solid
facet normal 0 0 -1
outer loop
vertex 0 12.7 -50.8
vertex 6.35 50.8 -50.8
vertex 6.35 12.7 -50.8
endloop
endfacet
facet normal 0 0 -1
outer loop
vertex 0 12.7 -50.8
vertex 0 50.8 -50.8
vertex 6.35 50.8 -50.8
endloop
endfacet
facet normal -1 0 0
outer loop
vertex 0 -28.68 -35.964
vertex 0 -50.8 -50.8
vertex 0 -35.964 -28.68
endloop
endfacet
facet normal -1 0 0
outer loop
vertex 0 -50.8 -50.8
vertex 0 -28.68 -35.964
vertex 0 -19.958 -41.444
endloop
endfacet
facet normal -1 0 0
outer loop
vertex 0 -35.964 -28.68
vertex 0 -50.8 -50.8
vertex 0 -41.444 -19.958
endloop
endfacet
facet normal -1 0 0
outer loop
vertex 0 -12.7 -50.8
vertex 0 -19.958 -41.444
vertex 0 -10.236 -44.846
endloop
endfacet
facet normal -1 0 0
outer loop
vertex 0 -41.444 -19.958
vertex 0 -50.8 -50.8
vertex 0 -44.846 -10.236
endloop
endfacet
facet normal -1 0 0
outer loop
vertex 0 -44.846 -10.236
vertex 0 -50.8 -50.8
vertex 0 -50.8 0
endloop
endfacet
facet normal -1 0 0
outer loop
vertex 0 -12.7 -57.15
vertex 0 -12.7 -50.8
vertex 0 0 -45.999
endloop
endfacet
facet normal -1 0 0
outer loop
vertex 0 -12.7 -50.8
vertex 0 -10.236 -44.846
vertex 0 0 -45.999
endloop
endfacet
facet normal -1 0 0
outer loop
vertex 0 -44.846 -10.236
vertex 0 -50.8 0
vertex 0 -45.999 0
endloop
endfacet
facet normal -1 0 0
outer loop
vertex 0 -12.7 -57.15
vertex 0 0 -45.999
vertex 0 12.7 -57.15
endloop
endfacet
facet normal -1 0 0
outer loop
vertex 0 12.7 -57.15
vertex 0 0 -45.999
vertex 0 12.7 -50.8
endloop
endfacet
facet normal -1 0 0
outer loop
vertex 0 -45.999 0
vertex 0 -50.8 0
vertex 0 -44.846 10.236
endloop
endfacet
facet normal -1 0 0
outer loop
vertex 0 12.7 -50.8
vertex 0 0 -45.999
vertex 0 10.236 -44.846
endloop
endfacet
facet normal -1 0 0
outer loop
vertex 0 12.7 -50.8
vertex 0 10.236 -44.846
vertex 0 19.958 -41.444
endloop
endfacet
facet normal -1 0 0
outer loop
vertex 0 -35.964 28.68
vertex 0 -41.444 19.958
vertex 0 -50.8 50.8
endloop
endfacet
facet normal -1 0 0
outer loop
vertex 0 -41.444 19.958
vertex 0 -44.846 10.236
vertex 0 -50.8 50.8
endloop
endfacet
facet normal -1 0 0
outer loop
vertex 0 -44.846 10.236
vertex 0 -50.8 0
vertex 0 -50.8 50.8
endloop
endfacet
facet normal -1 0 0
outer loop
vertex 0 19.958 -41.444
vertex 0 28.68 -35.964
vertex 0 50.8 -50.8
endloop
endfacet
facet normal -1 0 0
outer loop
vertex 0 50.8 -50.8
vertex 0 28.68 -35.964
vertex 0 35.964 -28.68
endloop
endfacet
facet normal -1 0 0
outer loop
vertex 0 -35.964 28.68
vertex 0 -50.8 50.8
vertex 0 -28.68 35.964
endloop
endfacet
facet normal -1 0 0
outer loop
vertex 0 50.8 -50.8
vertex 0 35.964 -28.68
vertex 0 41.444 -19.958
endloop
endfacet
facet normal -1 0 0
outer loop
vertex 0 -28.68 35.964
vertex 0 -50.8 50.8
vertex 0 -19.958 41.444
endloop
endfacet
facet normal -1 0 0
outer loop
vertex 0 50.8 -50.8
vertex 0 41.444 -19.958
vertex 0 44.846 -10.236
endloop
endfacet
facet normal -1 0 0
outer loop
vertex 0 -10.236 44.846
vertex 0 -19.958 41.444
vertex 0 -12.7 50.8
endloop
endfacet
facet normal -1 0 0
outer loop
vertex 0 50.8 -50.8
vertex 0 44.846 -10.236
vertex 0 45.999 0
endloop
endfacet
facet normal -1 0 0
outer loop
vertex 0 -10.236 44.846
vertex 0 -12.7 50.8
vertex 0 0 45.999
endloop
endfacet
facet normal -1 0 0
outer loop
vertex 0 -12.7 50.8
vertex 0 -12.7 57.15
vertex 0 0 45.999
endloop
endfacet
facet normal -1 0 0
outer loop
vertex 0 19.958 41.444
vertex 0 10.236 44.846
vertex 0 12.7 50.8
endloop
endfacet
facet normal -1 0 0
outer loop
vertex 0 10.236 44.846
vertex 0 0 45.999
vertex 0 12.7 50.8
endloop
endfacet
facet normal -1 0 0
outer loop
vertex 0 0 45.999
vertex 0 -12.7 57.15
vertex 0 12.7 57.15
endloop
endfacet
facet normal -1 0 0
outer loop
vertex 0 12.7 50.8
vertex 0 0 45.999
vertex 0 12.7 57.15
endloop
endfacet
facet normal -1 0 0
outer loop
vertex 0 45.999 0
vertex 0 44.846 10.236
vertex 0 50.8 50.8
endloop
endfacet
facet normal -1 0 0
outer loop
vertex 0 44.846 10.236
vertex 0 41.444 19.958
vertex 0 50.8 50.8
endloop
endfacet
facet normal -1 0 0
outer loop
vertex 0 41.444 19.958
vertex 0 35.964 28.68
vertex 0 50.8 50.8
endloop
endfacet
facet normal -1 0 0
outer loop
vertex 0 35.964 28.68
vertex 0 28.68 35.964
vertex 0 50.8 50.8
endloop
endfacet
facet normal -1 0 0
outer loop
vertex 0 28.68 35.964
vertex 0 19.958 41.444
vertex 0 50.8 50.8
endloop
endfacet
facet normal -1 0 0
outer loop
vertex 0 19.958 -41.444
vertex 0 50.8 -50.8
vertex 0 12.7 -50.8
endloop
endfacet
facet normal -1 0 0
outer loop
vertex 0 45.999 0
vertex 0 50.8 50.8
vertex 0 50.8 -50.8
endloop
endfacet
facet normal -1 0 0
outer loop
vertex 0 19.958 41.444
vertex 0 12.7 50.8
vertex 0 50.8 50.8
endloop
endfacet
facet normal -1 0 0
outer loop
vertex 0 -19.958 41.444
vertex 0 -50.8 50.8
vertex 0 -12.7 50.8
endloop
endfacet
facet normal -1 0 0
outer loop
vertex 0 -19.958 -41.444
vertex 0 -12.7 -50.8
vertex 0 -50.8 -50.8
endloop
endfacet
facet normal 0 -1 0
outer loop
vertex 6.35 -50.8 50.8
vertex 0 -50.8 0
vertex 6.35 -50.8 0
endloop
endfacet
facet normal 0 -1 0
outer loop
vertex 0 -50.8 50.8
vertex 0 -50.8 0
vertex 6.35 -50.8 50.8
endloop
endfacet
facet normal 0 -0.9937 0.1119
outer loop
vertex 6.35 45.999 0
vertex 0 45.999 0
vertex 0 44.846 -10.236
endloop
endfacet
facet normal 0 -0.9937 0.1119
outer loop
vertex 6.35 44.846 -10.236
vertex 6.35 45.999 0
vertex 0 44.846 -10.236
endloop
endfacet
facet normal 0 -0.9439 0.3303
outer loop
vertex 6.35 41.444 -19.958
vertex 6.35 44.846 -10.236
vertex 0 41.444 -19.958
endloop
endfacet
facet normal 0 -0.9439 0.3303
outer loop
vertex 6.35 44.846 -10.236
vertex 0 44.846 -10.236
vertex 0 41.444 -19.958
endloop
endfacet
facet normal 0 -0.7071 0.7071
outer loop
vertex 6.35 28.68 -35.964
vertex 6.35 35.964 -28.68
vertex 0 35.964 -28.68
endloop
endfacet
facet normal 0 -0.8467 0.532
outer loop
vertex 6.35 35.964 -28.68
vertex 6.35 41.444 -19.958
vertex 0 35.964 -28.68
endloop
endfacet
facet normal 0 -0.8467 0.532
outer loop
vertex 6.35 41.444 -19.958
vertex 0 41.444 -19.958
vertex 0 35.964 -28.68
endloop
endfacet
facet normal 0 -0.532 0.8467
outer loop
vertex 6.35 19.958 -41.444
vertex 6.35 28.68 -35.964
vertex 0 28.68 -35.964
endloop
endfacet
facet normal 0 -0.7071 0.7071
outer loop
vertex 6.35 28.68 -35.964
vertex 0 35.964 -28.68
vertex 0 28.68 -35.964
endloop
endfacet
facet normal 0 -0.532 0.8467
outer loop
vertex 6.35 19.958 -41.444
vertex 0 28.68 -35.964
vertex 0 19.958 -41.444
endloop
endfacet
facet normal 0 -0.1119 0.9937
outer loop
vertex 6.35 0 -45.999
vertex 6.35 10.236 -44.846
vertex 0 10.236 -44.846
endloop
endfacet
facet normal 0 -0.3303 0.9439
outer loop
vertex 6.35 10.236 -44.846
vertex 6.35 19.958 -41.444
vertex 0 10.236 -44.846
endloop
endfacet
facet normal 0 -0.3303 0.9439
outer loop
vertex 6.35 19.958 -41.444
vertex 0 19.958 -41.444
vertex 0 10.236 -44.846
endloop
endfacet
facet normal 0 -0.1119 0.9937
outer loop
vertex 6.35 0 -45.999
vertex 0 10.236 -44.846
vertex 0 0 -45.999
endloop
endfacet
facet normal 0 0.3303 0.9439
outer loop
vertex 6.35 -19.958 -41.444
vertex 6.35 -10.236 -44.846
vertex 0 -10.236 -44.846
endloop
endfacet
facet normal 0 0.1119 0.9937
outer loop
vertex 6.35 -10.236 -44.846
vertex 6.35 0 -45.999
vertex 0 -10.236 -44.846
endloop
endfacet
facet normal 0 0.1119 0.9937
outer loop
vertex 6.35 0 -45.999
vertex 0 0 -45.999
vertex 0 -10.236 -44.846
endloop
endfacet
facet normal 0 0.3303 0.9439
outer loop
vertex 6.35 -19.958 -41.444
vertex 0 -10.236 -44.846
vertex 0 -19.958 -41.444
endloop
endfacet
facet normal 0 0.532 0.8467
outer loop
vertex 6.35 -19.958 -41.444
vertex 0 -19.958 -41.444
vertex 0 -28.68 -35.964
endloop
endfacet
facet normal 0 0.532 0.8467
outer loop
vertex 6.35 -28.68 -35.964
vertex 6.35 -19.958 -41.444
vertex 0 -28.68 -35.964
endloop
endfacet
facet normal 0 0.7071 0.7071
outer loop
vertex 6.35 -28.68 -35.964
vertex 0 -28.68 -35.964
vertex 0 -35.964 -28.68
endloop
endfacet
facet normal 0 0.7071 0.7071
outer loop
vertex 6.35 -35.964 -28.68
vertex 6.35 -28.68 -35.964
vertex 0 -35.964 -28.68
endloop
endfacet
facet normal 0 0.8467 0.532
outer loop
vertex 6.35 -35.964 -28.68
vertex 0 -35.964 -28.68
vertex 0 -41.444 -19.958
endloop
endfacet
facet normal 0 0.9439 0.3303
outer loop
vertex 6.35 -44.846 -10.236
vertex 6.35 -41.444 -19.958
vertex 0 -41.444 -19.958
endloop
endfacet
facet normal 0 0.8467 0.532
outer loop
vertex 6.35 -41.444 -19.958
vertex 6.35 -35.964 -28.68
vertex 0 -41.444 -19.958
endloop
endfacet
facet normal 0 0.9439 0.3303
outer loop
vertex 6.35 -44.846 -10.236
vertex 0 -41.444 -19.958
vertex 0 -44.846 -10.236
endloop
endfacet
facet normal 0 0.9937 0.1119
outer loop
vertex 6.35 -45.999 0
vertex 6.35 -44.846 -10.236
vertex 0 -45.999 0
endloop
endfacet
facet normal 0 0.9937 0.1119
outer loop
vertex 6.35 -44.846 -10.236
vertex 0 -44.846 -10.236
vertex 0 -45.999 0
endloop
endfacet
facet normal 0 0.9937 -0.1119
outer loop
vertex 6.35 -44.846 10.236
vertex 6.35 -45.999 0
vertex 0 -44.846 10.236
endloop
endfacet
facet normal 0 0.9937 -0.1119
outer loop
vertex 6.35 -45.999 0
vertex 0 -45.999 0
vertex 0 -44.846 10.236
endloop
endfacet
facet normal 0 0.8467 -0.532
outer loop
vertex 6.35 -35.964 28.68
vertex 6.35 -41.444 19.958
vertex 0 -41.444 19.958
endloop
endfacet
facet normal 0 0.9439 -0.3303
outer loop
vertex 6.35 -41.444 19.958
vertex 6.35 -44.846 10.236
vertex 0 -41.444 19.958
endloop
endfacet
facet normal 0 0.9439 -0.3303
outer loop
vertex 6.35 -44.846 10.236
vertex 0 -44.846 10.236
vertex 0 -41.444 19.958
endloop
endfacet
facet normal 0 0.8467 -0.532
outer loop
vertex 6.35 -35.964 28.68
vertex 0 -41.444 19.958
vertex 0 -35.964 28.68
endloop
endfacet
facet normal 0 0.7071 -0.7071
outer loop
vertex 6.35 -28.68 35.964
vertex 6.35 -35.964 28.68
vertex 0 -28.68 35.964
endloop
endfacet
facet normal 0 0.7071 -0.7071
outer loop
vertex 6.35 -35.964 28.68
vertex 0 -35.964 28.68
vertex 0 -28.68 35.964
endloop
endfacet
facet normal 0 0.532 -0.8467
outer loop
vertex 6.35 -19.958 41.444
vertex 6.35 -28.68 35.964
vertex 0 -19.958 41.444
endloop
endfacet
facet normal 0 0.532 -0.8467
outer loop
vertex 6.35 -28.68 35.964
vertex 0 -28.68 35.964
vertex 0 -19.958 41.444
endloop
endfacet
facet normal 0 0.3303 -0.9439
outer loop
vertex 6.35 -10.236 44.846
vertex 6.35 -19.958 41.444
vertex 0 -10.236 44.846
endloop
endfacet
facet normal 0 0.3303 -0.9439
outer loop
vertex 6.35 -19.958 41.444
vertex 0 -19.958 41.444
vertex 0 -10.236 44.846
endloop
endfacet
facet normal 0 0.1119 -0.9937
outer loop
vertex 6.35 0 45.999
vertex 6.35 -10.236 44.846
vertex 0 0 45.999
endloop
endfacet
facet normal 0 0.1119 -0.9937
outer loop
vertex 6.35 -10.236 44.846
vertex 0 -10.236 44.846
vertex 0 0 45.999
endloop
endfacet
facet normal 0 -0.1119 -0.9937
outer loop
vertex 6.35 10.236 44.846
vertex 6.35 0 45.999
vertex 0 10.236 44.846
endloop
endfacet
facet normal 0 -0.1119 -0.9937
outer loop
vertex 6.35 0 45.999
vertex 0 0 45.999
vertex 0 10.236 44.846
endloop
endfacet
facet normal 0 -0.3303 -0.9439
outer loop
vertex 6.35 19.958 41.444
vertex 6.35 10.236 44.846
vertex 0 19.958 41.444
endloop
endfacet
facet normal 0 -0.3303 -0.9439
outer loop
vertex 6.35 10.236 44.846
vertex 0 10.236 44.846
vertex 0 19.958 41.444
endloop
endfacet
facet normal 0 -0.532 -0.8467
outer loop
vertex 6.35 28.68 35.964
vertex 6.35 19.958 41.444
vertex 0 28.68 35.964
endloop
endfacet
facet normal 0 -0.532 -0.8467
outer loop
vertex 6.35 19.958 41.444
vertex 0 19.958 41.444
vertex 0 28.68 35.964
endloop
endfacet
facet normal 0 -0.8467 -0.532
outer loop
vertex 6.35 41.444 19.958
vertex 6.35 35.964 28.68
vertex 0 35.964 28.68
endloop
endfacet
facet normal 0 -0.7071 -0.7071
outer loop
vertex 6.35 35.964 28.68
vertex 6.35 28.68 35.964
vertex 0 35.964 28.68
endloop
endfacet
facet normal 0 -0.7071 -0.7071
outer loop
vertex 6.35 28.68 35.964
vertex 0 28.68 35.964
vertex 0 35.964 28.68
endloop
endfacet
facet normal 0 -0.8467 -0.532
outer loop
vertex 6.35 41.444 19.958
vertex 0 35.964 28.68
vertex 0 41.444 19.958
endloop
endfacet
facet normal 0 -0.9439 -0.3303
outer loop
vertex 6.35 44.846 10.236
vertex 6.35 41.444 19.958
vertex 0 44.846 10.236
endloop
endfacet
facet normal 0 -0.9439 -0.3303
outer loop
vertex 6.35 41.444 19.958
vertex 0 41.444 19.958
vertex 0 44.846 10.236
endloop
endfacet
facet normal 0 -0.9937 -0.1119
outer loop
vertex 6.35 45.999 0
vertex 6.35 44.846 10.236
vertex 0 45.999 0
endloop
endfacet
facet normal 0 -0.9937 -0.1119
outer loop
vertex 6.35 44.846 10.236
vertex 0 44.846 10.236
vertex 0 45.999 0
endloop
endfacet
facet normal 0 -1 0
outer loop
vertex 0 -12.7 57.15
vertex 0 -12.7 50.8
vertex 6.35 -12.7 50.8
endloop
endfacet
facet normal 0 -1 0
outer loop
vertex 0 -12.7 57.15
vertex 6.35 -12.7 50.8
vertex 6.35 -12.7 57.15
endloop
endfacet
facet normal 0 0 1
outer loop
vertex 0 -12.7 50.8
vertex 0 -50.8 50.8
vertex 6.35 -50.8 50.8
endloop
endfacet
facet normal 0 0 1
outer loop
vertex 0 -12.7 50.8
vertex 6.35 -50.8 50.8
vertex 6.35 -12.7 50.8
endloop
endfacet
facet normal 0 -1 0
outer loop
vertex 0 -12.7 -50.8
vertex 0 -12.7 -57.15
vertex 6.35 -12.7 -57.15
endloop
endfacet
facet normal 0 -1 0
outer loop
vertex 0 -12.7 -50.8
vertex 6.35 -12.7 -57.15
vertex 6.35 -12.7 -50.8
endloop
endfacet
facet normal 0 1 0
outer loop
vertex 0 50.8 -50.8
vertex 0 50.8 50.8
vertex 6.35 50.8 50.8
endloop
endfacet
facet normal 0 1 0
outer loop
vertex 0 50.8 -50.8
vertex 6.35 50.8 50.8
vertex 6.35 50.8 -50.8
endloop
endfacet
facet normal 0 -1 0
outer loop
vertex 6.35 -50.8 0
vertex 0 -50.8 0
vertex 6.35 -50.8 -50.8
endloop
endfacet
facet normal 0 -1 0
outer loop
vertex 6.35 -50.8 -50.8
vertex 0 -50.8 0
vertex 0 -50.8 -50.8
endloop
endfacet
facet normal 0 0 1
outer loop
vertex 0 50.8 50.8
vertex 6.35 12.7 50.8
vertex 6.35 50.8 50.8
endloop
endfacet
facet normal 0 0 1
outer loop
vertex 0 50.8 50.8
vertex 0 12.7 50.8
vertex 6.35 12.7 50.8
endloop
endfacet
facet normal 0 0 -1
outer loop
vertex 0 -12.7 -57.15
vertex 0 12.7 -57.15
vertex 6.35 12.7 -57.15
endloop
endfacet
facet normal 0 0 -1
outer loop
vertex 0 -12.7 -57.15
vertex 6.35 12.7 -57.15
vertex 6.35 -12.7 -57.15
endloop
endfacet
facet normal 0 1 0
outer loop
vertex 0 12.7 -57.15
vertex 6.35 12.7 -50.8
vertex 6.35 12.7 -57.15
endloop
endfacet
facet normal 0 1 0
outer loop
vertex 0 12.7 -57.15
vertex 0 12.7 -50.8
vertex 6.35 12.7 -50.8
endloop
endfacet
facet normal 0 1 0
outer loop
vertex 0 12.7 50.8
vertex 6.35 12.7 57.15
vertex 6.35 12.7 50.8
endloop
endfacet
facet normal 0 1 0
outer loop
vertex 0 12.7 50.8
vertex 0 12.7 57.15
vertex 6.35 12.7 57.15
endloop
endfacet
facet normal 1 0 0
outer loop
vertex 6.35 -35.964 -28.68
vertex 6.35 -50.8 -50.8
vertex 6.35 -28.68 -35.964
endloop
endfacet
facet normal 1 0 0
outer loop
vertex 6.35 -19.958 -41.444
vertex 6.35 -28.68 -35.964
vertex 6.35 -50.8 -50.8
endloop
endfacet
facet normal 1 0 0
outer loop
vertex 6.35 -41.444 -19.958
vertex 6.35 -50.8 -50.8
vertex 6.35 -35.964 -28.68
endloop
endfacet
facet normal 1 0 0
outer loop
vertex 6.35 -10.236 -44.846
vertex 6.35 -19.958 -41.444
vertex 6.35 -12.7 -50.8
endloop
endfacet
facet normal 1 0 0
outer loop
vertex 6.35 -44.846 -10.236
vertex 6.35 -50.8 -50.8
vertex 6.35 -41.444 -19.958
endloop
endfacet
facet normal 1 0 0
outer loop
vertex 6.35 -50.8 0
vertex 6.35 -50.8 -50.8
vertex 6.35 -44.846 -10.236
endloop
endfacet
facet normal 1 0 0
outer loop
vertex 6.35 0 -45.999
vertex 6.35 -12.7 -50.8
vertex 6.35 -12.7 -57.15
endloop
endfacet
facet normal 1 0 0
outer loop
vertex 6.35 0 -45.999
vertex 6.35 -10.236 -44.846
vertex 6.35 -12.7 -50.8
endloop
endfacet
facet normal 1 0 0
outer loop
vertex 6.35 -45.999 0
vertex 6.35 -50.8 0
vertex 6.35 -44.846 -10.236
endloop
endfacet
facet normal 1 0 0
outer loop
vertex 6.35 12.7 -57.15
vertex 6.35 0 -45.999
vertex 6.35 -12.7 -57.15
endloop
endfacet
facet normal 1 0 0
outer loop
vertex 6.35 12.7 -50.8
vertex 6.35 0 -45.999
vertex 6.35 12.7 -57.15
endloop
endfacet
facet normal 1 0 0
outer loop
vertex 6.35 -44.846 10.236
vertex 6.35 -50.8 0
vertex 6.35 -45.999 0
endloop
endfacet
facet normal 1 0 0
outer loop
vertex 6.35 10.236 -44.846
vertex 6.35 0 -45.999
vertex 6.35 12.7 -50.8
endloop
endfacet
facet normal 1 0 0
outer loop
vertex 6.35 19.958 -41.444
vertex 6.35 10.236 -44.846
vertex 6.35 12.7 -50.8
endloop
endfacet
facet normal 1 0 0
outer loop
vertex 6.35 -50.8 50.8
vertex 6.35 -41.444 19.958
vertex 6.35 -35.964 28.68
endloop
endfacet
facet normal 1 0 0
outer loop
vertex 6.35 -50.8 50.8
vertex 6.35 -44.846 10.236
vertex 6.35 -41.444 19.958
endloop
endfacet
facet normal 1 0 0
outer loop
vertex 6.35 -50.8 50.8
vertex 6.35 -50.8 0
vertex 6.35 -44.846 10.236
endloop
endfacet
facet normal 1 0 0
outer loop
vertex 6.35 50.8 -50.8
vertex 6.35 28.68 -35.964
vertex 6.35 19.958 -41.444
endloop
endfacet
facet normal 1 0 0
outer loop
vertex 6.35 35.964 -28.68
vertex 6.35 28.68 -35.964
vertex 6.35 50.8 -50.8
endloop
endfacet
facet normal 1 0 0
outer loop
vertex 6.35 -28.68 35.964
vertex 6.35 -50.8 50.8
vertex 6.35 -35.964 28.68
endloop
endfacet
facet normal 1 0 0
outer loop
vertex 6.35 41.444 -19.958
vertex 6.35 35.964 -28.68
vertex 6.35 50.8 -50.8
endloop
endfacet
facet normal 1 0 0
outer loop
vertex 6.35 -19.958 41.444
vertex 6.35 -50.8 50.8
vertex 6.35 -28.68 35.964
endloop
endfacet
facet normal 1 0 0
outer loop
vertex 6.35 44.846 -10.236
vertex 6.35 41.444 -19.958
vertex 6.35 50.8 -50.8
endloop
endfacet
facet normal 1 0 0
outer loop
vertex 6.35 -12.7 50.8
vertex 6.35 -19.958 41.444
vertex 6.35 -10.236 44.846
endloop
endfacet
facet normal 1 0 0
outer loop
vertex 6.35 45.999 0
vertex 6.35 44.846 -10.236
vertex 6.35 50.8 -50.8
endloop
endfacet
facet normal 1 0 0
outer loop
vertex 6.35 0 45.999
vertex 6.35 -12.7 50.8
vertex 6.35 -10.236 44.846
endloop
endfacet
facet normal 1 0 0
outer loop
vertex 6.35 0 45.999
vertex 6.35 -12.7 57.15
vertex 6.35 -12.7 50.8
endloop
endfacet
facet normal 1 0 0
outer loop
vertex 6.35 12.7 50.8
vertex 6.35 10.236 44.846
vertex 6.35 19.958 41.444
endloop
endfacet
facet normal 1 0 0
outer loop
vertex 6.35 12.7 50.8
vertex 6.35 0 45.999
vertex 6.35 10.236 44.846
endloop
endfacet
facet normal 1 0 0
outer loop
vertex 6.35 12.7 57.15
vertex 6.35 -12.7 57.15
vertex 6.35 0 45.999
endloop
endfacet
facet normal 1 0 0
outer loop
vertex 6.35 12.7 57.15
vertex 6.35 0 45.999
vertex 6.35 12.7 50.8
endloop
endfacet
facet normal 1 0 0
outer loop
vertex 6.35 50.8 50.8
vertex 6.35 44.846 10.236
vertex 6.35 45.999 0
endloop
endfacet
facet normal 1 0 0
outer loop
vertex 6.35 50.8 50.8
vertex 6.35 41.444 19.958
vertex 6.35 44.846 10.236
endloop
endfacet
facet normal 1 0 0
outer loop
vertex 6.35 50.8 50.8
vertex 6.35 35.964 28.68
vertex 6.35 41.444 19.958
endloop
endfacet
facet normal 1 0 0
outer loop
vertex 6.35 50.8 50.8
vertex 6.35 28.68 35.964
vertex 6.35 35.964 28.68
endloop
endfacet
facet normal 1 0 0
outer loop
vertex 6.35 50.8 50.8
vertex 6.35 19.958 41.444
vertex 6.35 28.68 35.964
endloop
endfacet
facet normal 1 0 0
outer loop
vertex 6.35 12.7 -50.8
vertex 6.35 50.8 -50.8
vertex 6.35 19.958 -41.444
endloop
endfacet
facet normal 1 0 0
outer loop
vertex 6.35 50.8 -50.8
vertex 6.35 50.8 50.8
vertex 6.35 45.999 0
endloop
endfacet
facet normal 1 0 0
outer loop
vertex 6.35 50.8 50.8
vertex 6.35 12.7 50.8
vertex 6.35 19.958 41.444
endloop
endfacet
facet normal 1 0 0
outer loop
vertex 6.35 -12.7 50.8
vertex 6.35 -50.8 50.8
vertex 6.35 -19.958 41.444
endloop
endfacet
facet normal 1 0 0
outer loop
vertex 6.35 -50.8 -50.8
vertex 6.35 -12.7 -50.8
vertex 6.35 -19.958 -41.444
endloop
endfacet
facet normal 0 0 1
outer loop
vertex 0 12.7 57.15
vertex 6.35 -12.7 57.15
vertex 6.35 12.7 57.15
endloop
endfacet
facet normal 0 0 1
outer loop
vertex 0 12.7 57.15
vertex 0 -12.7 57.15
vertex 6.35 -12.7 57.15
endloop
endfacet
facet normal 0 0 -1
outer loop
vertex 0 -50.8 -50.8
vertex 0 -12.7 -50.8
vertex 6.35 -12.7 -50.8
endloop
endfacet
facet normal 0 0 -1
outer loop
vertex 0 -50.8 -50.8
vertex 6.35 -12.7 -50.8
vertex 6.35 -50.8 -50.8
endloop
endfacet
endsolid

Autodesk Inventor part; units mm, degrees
ref_plane "YZ Plane" through (0, 0, 0) normal (1, 0, 0) x (0, 1, 0)
ref_plane "XZ Plane" through (0, 0, 0) normal (0, 1, 0) x (-1, 0, 0)
ref_plane "XY Plane" through (0, 0, 0) normal (0, 0, 1) x (1, 0, 0)
sketch "Sketch1" plane through (0, 0, 0) normal (1, 0, 0) x (0, 1, 0)
  circle A0 centre (0, 0) radius 45.9994
  line L0 (-50.8, 0) -> (-50.8, 50.8)
  line L1 (-50.8, 0) -> (-50.8, -50.8)
  line L2 (-50.8, 50.8) -> (-12.7, 50.8)
  line L3 (-12.7, 50.8) -> (-12.7, 57.15)
  line L4 (-12.7, 57.15) -> (12.7, 57.15)
  line L5 (12.7, 57.15) -> (12.7, 50.8)
  line L6 (12.7, 50.8) -> (50.8, 50.8)
  line L7 (50.8, 50.8) -> (50.8, -50.8)
  line L8 (50.8, -50.8) -> (12.7, -50.8)
  line L9 (12.7, -50.8) -> (12.7, -57.15)
  line L10 (12.7, -57.15) -> (-12.7, -57.15)
  line L11 (-12.7, -57.15) -> (-12.7, -50.8)
  line L12 (-12.7, -50.8) -> (-50.8, -50.8)
  dimension "d0" = 91.9988
  dimension "d1" = 50.8
  dimension "d2" = 50.8
  dimension "d3" = 50.8
  dimension "d4" = 38.1
  dimension "d5" = 6.35
  dimension "d6" = 25.4
  dimension "d7" = 38.1
  dimension "d8" = 101.6
  dimension "d9" = 38.1
  dimension "d10" = 6.35
  dimension "d11" = 25.4
  dimension "d12" = 6.35
extrude "Extrusion1" add sketch "Sketch1" along normal blind 6.35
properties part number "speakermount"
